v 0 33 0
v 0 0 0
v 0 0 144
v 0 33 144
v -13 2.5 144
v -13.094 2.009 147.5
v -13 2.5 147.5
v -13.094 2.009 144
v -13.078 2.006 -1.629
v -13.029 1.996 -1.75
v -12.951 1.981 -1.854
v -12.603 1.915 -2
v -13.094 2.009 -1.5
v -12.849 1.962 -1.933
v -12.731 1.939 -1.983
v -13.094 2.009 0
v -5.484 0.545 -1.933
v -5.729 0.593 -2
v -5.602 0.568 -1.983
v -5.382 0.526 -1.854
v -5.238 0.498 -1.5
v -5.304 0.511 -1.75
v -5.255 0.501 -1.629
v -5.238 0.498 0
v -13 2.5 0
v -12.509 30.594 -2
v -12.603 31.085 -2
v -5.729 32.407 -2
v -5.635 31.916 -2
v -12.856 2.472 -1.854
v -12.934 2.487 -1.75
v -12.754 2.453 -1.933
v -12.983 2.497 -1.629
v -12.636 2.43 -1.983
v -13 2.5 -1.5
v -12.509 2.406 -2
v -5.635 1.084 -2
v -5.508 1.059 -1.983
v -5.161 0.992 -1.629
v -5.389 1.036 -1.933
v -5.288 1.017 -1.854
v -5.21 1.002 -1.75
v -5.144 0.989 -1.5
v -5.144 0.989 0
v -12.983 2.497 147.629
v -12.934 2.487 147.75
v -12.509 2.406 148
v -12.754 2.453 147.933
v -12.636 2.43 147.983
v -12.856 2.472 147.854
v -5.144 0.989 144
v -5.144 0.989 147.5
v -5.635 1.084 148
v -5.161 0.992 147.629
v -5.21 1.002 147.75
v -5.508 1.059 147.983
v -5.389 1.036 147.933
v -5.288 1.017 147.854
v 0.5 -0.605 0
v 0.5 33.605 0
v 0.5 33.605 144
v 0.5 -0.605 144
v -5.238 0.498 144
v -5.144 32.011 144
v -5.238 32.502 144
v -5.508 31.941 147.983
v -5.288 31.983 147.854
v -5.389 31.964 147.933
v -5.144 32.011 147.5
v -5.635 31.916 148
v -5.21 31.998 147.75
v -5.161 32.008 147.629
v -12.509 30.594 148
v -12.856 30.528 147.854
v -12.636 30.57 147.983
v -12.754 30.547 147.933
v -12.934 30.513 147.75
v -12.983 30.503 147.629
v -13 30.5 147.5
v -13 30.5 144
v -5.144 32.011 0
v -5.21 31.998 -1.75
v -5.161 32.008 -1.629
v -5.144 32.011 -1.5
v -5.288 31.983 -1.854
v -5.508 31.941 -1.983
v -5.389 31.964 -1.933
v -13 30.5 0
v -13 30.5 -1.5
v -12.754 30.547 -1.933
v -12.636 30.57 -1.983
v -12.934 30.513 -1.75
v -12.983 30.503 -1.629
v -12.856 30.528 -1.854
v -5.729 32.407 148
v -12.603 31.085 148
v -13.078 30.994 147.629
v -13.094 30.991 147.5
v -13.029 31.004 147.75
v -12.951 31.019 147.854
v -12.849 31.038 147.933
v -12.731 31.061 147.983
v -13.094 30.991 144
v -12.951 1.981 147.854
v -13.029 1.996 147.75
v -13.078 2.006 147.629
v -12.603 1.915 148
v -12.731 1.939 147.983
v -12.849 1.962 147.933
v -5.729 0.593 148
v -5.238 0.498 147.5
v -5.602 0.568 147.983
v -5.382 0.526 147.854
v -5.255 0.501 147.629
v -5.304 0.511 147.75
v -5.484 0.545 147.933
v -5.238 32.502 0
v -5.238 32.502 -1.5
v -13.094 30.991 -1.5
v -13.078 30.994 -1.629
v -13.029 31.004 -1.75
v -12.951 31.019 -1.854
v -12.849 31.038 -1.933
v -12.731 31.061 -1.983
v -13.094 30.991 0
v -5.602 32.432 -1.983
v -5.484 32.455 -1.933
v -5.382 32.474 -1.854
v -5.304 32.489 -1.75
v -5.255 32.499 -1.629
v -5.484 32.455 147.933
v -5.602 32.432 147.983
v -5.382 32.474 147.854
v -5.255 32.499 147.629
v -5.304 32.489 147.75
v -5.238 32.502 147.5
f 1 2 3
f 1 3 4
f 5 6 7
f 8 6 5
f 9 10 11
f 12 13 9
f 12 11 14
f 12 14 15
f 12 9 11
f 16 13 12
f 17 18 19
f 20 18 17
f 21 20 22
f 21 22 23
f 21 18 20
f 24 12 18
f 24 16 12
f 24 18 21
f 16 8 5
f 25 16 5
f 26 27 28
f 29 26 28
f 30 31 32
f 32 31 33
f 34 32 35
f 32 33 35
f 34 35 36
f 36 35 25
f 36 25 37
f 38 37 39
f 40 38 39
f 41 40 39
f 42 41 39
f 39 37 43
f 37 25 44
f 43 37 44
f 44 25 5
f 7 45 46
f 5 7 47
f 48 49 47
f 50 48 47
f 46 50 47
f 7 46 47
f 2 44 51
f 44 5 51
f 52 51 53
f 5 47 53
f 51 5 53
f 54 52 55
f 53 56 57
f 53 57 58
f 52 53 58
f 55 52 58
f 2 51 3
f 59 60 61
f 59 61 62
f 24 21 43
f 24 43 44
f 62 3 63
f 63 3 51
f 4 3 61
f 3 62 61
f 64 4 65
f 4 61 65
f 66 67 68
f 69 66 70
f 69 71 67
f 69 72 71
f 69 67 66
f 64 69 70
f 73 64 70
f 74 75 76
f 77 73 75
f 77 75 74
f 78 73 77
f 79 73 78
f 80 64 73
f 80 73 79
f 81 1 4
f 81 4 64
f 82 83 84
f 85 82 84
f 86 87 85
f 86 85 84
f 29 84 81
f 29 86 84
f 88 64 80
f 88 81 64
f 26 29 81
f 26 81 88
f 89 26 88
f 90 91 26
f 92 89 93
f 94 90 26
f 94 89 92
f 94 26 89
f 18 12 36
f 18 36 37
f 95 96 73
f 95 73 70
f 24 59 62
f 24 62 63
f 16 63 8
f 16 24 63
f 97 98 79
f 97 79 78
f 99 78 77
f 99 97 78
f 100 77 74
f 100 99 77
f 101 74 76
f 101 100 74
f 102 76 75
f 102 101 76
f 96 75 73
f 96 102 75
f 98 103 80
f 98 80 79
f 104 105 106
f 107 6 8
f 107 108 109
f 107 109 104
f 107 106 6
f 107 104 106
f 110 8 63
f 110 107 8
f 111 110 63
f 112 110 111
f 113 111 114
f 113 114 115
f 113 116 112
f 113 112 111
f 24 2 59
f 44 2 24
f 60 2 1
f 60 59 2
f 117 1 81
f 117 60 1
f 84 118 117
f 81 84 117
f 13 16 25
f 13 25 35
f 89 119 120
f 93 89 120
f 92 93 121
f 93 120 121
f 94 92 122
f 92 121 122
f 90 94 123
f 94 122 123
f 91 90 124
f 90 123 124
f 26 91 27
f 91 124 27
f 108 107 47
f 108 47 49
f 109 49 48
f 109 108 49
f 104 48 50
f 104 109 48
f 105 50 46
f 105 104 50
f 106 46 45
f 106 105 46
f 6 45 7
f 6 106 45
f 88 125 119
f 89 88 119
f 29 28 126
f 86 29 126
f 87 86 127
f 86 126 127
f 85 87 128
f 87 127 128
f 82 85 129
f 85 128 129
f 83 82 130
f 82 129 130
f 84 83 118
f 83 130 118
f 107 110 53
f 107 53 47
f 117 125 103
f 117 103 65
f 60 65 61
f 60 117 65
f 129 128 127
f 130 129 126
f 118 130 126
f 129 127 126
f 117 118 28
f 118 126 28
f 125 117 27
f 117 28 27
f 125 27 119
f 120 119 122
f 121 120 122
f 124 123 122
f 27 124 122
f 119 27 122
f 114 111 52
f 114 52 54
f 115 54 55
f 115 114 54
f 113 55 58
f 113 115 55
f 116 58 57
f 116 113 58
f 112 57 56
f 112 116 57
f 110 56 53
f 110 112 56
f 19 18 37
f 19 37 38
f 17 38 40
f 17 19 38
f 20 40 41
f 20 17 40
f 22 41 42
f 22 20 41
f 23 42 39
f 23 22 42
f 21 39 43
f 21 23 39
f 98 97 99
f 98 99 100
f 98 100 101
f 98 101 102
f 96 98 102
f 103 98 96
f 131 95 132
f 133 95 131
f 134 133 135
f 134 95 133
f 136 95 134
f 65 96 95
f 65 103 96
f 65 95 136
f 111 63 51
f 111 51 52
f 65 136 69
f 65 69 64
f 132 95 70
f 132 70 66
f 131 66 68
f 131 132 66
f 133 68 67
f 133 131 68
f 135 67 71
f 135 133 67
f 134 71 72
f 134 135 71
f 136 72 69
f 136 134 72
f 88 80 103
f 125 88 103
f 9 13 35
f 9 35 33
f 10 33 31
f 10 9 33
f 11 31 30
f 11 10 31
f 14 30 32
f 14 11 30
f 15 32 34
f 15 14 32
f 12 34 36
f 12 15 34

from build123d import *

# Parameters (mm, degrees)
BOSS_EXTRUDE1_DEPTH = 144
BOSS_EXTRUDE2_DEPTH = 0.5
BOSS_EXTRUDE3_DEPTH = 0.5


with BuildPart() as part:
    # Sketch1 → Boss-Extrude1 (new body)
    with BuildSketch(Plane.XY):
        Polygon((-13, 2.5), (0, 0), (0, 33), (-13, 30.5), (-13.094423697, 30.991003223), (0.5, 33.605315473), (0.5, -0.605315473), (-13.094423697, 2.008996777), align=None)
    extrude(amount=BOSS_EXTRUDE1_DEPTH)

    # Sketch2 → Boss-Extrude2 (add)
    with BuildSketch(Plane(origin=(-6.214252513, 32.314113067, 0), x_dir=(0.9820064469806473, 0.18884739365012462, 0), z_dir=(-0.18884739365012462, 0.9820064469806473, 0))):
        with BuildLine():
            Line((-7.006238304, 0), (-7.006238304, 1.5))
            ThreePointArc((-7.006238304, 1.5), (-6.859791695, 1.853553391), (-6.506238304, 2))
            Line((-6.506238304, 2), (0.493761696, 2))
            ThreePointArc((0.493761696, 2), (0.847315086, 1.853553391), (0.993761696, 1.5))
            Line((0.993761696, 1.5), (0.993761696, 0))
            Line((0.993761696, 0), (-7.006238304, 0))
        make_face()
        with BuildLine():
            Line((-7.006238304, -144), (-7.006238304, -147.5))
            ThreePointArc((-7.006238304, -147.5), (-6.859791695, -147.853553391), (-6.506238304, -148))
            Line((-6.506238304, -148), (0.493761696, -148))
            ThreePointArc((0.493761696, -148), (0.847315086, -147.853553391), (0.993761696, -147.5))
            Line((0.993761696, -147.5), (0.993761696, -144))
            Line((0.993761696, -144), (-7.006238304, -144))
        make_face()
    extrude(amount=-BOSS_EXTRUDE2_DEPTH)

    # Sketch3 → Boss-Extrude3 (add)
    with BuildSketch(Plane(origin=(-0.094423697, -0.491003223, 0), x_dir=(0.9820064469806474, -0.18884739365012435, 0), z_dir=(-0.18884739365012435, -0.9820064469806474, 0))):
        with BuildLine():
            Line((-13.238202295, 147.5), (-13.238202295, 144))
            Line((-13.238202295, 144), (-5.238202295, 144))
            Line((-5.238202295, 144), (-5.238202295, 147.5))
            ThreePointArc((-5.238202295, 147.5), (-5.384648904, 147.853553391), (-5.738202295, 148))
            Line((-5.738202295, 148), (-12.738202295, 148))
            ThreePointArc((-12.738202295, 148), (-13.091755685, 147.853553391), (-13.238202295, 147.5))
        make_face()
        with BuildLine():
            Line((-5.238202295, 0), (-13.238202295, 0))
            Line((-13.238202295, 0), (-13.238202295, -1.5))
            ThreePointArc((-13.238202295, -1.5), (-13.091755685, -1.853553391), (-12.738202295, -2))
            Line((-12.738202295, -2), (-5.738202295, -2))
            ThreePointArc((-5.738202295, -2), (-5.384648904, -1.853553391), (-5.238202295, -1.5))
            Line((-5.238202295, -1.5), (-5.238202295, 0))
        make_face()
    extrude(amount=-BOSS_EXTRUDE3_DEPTH)


solid = part.part
